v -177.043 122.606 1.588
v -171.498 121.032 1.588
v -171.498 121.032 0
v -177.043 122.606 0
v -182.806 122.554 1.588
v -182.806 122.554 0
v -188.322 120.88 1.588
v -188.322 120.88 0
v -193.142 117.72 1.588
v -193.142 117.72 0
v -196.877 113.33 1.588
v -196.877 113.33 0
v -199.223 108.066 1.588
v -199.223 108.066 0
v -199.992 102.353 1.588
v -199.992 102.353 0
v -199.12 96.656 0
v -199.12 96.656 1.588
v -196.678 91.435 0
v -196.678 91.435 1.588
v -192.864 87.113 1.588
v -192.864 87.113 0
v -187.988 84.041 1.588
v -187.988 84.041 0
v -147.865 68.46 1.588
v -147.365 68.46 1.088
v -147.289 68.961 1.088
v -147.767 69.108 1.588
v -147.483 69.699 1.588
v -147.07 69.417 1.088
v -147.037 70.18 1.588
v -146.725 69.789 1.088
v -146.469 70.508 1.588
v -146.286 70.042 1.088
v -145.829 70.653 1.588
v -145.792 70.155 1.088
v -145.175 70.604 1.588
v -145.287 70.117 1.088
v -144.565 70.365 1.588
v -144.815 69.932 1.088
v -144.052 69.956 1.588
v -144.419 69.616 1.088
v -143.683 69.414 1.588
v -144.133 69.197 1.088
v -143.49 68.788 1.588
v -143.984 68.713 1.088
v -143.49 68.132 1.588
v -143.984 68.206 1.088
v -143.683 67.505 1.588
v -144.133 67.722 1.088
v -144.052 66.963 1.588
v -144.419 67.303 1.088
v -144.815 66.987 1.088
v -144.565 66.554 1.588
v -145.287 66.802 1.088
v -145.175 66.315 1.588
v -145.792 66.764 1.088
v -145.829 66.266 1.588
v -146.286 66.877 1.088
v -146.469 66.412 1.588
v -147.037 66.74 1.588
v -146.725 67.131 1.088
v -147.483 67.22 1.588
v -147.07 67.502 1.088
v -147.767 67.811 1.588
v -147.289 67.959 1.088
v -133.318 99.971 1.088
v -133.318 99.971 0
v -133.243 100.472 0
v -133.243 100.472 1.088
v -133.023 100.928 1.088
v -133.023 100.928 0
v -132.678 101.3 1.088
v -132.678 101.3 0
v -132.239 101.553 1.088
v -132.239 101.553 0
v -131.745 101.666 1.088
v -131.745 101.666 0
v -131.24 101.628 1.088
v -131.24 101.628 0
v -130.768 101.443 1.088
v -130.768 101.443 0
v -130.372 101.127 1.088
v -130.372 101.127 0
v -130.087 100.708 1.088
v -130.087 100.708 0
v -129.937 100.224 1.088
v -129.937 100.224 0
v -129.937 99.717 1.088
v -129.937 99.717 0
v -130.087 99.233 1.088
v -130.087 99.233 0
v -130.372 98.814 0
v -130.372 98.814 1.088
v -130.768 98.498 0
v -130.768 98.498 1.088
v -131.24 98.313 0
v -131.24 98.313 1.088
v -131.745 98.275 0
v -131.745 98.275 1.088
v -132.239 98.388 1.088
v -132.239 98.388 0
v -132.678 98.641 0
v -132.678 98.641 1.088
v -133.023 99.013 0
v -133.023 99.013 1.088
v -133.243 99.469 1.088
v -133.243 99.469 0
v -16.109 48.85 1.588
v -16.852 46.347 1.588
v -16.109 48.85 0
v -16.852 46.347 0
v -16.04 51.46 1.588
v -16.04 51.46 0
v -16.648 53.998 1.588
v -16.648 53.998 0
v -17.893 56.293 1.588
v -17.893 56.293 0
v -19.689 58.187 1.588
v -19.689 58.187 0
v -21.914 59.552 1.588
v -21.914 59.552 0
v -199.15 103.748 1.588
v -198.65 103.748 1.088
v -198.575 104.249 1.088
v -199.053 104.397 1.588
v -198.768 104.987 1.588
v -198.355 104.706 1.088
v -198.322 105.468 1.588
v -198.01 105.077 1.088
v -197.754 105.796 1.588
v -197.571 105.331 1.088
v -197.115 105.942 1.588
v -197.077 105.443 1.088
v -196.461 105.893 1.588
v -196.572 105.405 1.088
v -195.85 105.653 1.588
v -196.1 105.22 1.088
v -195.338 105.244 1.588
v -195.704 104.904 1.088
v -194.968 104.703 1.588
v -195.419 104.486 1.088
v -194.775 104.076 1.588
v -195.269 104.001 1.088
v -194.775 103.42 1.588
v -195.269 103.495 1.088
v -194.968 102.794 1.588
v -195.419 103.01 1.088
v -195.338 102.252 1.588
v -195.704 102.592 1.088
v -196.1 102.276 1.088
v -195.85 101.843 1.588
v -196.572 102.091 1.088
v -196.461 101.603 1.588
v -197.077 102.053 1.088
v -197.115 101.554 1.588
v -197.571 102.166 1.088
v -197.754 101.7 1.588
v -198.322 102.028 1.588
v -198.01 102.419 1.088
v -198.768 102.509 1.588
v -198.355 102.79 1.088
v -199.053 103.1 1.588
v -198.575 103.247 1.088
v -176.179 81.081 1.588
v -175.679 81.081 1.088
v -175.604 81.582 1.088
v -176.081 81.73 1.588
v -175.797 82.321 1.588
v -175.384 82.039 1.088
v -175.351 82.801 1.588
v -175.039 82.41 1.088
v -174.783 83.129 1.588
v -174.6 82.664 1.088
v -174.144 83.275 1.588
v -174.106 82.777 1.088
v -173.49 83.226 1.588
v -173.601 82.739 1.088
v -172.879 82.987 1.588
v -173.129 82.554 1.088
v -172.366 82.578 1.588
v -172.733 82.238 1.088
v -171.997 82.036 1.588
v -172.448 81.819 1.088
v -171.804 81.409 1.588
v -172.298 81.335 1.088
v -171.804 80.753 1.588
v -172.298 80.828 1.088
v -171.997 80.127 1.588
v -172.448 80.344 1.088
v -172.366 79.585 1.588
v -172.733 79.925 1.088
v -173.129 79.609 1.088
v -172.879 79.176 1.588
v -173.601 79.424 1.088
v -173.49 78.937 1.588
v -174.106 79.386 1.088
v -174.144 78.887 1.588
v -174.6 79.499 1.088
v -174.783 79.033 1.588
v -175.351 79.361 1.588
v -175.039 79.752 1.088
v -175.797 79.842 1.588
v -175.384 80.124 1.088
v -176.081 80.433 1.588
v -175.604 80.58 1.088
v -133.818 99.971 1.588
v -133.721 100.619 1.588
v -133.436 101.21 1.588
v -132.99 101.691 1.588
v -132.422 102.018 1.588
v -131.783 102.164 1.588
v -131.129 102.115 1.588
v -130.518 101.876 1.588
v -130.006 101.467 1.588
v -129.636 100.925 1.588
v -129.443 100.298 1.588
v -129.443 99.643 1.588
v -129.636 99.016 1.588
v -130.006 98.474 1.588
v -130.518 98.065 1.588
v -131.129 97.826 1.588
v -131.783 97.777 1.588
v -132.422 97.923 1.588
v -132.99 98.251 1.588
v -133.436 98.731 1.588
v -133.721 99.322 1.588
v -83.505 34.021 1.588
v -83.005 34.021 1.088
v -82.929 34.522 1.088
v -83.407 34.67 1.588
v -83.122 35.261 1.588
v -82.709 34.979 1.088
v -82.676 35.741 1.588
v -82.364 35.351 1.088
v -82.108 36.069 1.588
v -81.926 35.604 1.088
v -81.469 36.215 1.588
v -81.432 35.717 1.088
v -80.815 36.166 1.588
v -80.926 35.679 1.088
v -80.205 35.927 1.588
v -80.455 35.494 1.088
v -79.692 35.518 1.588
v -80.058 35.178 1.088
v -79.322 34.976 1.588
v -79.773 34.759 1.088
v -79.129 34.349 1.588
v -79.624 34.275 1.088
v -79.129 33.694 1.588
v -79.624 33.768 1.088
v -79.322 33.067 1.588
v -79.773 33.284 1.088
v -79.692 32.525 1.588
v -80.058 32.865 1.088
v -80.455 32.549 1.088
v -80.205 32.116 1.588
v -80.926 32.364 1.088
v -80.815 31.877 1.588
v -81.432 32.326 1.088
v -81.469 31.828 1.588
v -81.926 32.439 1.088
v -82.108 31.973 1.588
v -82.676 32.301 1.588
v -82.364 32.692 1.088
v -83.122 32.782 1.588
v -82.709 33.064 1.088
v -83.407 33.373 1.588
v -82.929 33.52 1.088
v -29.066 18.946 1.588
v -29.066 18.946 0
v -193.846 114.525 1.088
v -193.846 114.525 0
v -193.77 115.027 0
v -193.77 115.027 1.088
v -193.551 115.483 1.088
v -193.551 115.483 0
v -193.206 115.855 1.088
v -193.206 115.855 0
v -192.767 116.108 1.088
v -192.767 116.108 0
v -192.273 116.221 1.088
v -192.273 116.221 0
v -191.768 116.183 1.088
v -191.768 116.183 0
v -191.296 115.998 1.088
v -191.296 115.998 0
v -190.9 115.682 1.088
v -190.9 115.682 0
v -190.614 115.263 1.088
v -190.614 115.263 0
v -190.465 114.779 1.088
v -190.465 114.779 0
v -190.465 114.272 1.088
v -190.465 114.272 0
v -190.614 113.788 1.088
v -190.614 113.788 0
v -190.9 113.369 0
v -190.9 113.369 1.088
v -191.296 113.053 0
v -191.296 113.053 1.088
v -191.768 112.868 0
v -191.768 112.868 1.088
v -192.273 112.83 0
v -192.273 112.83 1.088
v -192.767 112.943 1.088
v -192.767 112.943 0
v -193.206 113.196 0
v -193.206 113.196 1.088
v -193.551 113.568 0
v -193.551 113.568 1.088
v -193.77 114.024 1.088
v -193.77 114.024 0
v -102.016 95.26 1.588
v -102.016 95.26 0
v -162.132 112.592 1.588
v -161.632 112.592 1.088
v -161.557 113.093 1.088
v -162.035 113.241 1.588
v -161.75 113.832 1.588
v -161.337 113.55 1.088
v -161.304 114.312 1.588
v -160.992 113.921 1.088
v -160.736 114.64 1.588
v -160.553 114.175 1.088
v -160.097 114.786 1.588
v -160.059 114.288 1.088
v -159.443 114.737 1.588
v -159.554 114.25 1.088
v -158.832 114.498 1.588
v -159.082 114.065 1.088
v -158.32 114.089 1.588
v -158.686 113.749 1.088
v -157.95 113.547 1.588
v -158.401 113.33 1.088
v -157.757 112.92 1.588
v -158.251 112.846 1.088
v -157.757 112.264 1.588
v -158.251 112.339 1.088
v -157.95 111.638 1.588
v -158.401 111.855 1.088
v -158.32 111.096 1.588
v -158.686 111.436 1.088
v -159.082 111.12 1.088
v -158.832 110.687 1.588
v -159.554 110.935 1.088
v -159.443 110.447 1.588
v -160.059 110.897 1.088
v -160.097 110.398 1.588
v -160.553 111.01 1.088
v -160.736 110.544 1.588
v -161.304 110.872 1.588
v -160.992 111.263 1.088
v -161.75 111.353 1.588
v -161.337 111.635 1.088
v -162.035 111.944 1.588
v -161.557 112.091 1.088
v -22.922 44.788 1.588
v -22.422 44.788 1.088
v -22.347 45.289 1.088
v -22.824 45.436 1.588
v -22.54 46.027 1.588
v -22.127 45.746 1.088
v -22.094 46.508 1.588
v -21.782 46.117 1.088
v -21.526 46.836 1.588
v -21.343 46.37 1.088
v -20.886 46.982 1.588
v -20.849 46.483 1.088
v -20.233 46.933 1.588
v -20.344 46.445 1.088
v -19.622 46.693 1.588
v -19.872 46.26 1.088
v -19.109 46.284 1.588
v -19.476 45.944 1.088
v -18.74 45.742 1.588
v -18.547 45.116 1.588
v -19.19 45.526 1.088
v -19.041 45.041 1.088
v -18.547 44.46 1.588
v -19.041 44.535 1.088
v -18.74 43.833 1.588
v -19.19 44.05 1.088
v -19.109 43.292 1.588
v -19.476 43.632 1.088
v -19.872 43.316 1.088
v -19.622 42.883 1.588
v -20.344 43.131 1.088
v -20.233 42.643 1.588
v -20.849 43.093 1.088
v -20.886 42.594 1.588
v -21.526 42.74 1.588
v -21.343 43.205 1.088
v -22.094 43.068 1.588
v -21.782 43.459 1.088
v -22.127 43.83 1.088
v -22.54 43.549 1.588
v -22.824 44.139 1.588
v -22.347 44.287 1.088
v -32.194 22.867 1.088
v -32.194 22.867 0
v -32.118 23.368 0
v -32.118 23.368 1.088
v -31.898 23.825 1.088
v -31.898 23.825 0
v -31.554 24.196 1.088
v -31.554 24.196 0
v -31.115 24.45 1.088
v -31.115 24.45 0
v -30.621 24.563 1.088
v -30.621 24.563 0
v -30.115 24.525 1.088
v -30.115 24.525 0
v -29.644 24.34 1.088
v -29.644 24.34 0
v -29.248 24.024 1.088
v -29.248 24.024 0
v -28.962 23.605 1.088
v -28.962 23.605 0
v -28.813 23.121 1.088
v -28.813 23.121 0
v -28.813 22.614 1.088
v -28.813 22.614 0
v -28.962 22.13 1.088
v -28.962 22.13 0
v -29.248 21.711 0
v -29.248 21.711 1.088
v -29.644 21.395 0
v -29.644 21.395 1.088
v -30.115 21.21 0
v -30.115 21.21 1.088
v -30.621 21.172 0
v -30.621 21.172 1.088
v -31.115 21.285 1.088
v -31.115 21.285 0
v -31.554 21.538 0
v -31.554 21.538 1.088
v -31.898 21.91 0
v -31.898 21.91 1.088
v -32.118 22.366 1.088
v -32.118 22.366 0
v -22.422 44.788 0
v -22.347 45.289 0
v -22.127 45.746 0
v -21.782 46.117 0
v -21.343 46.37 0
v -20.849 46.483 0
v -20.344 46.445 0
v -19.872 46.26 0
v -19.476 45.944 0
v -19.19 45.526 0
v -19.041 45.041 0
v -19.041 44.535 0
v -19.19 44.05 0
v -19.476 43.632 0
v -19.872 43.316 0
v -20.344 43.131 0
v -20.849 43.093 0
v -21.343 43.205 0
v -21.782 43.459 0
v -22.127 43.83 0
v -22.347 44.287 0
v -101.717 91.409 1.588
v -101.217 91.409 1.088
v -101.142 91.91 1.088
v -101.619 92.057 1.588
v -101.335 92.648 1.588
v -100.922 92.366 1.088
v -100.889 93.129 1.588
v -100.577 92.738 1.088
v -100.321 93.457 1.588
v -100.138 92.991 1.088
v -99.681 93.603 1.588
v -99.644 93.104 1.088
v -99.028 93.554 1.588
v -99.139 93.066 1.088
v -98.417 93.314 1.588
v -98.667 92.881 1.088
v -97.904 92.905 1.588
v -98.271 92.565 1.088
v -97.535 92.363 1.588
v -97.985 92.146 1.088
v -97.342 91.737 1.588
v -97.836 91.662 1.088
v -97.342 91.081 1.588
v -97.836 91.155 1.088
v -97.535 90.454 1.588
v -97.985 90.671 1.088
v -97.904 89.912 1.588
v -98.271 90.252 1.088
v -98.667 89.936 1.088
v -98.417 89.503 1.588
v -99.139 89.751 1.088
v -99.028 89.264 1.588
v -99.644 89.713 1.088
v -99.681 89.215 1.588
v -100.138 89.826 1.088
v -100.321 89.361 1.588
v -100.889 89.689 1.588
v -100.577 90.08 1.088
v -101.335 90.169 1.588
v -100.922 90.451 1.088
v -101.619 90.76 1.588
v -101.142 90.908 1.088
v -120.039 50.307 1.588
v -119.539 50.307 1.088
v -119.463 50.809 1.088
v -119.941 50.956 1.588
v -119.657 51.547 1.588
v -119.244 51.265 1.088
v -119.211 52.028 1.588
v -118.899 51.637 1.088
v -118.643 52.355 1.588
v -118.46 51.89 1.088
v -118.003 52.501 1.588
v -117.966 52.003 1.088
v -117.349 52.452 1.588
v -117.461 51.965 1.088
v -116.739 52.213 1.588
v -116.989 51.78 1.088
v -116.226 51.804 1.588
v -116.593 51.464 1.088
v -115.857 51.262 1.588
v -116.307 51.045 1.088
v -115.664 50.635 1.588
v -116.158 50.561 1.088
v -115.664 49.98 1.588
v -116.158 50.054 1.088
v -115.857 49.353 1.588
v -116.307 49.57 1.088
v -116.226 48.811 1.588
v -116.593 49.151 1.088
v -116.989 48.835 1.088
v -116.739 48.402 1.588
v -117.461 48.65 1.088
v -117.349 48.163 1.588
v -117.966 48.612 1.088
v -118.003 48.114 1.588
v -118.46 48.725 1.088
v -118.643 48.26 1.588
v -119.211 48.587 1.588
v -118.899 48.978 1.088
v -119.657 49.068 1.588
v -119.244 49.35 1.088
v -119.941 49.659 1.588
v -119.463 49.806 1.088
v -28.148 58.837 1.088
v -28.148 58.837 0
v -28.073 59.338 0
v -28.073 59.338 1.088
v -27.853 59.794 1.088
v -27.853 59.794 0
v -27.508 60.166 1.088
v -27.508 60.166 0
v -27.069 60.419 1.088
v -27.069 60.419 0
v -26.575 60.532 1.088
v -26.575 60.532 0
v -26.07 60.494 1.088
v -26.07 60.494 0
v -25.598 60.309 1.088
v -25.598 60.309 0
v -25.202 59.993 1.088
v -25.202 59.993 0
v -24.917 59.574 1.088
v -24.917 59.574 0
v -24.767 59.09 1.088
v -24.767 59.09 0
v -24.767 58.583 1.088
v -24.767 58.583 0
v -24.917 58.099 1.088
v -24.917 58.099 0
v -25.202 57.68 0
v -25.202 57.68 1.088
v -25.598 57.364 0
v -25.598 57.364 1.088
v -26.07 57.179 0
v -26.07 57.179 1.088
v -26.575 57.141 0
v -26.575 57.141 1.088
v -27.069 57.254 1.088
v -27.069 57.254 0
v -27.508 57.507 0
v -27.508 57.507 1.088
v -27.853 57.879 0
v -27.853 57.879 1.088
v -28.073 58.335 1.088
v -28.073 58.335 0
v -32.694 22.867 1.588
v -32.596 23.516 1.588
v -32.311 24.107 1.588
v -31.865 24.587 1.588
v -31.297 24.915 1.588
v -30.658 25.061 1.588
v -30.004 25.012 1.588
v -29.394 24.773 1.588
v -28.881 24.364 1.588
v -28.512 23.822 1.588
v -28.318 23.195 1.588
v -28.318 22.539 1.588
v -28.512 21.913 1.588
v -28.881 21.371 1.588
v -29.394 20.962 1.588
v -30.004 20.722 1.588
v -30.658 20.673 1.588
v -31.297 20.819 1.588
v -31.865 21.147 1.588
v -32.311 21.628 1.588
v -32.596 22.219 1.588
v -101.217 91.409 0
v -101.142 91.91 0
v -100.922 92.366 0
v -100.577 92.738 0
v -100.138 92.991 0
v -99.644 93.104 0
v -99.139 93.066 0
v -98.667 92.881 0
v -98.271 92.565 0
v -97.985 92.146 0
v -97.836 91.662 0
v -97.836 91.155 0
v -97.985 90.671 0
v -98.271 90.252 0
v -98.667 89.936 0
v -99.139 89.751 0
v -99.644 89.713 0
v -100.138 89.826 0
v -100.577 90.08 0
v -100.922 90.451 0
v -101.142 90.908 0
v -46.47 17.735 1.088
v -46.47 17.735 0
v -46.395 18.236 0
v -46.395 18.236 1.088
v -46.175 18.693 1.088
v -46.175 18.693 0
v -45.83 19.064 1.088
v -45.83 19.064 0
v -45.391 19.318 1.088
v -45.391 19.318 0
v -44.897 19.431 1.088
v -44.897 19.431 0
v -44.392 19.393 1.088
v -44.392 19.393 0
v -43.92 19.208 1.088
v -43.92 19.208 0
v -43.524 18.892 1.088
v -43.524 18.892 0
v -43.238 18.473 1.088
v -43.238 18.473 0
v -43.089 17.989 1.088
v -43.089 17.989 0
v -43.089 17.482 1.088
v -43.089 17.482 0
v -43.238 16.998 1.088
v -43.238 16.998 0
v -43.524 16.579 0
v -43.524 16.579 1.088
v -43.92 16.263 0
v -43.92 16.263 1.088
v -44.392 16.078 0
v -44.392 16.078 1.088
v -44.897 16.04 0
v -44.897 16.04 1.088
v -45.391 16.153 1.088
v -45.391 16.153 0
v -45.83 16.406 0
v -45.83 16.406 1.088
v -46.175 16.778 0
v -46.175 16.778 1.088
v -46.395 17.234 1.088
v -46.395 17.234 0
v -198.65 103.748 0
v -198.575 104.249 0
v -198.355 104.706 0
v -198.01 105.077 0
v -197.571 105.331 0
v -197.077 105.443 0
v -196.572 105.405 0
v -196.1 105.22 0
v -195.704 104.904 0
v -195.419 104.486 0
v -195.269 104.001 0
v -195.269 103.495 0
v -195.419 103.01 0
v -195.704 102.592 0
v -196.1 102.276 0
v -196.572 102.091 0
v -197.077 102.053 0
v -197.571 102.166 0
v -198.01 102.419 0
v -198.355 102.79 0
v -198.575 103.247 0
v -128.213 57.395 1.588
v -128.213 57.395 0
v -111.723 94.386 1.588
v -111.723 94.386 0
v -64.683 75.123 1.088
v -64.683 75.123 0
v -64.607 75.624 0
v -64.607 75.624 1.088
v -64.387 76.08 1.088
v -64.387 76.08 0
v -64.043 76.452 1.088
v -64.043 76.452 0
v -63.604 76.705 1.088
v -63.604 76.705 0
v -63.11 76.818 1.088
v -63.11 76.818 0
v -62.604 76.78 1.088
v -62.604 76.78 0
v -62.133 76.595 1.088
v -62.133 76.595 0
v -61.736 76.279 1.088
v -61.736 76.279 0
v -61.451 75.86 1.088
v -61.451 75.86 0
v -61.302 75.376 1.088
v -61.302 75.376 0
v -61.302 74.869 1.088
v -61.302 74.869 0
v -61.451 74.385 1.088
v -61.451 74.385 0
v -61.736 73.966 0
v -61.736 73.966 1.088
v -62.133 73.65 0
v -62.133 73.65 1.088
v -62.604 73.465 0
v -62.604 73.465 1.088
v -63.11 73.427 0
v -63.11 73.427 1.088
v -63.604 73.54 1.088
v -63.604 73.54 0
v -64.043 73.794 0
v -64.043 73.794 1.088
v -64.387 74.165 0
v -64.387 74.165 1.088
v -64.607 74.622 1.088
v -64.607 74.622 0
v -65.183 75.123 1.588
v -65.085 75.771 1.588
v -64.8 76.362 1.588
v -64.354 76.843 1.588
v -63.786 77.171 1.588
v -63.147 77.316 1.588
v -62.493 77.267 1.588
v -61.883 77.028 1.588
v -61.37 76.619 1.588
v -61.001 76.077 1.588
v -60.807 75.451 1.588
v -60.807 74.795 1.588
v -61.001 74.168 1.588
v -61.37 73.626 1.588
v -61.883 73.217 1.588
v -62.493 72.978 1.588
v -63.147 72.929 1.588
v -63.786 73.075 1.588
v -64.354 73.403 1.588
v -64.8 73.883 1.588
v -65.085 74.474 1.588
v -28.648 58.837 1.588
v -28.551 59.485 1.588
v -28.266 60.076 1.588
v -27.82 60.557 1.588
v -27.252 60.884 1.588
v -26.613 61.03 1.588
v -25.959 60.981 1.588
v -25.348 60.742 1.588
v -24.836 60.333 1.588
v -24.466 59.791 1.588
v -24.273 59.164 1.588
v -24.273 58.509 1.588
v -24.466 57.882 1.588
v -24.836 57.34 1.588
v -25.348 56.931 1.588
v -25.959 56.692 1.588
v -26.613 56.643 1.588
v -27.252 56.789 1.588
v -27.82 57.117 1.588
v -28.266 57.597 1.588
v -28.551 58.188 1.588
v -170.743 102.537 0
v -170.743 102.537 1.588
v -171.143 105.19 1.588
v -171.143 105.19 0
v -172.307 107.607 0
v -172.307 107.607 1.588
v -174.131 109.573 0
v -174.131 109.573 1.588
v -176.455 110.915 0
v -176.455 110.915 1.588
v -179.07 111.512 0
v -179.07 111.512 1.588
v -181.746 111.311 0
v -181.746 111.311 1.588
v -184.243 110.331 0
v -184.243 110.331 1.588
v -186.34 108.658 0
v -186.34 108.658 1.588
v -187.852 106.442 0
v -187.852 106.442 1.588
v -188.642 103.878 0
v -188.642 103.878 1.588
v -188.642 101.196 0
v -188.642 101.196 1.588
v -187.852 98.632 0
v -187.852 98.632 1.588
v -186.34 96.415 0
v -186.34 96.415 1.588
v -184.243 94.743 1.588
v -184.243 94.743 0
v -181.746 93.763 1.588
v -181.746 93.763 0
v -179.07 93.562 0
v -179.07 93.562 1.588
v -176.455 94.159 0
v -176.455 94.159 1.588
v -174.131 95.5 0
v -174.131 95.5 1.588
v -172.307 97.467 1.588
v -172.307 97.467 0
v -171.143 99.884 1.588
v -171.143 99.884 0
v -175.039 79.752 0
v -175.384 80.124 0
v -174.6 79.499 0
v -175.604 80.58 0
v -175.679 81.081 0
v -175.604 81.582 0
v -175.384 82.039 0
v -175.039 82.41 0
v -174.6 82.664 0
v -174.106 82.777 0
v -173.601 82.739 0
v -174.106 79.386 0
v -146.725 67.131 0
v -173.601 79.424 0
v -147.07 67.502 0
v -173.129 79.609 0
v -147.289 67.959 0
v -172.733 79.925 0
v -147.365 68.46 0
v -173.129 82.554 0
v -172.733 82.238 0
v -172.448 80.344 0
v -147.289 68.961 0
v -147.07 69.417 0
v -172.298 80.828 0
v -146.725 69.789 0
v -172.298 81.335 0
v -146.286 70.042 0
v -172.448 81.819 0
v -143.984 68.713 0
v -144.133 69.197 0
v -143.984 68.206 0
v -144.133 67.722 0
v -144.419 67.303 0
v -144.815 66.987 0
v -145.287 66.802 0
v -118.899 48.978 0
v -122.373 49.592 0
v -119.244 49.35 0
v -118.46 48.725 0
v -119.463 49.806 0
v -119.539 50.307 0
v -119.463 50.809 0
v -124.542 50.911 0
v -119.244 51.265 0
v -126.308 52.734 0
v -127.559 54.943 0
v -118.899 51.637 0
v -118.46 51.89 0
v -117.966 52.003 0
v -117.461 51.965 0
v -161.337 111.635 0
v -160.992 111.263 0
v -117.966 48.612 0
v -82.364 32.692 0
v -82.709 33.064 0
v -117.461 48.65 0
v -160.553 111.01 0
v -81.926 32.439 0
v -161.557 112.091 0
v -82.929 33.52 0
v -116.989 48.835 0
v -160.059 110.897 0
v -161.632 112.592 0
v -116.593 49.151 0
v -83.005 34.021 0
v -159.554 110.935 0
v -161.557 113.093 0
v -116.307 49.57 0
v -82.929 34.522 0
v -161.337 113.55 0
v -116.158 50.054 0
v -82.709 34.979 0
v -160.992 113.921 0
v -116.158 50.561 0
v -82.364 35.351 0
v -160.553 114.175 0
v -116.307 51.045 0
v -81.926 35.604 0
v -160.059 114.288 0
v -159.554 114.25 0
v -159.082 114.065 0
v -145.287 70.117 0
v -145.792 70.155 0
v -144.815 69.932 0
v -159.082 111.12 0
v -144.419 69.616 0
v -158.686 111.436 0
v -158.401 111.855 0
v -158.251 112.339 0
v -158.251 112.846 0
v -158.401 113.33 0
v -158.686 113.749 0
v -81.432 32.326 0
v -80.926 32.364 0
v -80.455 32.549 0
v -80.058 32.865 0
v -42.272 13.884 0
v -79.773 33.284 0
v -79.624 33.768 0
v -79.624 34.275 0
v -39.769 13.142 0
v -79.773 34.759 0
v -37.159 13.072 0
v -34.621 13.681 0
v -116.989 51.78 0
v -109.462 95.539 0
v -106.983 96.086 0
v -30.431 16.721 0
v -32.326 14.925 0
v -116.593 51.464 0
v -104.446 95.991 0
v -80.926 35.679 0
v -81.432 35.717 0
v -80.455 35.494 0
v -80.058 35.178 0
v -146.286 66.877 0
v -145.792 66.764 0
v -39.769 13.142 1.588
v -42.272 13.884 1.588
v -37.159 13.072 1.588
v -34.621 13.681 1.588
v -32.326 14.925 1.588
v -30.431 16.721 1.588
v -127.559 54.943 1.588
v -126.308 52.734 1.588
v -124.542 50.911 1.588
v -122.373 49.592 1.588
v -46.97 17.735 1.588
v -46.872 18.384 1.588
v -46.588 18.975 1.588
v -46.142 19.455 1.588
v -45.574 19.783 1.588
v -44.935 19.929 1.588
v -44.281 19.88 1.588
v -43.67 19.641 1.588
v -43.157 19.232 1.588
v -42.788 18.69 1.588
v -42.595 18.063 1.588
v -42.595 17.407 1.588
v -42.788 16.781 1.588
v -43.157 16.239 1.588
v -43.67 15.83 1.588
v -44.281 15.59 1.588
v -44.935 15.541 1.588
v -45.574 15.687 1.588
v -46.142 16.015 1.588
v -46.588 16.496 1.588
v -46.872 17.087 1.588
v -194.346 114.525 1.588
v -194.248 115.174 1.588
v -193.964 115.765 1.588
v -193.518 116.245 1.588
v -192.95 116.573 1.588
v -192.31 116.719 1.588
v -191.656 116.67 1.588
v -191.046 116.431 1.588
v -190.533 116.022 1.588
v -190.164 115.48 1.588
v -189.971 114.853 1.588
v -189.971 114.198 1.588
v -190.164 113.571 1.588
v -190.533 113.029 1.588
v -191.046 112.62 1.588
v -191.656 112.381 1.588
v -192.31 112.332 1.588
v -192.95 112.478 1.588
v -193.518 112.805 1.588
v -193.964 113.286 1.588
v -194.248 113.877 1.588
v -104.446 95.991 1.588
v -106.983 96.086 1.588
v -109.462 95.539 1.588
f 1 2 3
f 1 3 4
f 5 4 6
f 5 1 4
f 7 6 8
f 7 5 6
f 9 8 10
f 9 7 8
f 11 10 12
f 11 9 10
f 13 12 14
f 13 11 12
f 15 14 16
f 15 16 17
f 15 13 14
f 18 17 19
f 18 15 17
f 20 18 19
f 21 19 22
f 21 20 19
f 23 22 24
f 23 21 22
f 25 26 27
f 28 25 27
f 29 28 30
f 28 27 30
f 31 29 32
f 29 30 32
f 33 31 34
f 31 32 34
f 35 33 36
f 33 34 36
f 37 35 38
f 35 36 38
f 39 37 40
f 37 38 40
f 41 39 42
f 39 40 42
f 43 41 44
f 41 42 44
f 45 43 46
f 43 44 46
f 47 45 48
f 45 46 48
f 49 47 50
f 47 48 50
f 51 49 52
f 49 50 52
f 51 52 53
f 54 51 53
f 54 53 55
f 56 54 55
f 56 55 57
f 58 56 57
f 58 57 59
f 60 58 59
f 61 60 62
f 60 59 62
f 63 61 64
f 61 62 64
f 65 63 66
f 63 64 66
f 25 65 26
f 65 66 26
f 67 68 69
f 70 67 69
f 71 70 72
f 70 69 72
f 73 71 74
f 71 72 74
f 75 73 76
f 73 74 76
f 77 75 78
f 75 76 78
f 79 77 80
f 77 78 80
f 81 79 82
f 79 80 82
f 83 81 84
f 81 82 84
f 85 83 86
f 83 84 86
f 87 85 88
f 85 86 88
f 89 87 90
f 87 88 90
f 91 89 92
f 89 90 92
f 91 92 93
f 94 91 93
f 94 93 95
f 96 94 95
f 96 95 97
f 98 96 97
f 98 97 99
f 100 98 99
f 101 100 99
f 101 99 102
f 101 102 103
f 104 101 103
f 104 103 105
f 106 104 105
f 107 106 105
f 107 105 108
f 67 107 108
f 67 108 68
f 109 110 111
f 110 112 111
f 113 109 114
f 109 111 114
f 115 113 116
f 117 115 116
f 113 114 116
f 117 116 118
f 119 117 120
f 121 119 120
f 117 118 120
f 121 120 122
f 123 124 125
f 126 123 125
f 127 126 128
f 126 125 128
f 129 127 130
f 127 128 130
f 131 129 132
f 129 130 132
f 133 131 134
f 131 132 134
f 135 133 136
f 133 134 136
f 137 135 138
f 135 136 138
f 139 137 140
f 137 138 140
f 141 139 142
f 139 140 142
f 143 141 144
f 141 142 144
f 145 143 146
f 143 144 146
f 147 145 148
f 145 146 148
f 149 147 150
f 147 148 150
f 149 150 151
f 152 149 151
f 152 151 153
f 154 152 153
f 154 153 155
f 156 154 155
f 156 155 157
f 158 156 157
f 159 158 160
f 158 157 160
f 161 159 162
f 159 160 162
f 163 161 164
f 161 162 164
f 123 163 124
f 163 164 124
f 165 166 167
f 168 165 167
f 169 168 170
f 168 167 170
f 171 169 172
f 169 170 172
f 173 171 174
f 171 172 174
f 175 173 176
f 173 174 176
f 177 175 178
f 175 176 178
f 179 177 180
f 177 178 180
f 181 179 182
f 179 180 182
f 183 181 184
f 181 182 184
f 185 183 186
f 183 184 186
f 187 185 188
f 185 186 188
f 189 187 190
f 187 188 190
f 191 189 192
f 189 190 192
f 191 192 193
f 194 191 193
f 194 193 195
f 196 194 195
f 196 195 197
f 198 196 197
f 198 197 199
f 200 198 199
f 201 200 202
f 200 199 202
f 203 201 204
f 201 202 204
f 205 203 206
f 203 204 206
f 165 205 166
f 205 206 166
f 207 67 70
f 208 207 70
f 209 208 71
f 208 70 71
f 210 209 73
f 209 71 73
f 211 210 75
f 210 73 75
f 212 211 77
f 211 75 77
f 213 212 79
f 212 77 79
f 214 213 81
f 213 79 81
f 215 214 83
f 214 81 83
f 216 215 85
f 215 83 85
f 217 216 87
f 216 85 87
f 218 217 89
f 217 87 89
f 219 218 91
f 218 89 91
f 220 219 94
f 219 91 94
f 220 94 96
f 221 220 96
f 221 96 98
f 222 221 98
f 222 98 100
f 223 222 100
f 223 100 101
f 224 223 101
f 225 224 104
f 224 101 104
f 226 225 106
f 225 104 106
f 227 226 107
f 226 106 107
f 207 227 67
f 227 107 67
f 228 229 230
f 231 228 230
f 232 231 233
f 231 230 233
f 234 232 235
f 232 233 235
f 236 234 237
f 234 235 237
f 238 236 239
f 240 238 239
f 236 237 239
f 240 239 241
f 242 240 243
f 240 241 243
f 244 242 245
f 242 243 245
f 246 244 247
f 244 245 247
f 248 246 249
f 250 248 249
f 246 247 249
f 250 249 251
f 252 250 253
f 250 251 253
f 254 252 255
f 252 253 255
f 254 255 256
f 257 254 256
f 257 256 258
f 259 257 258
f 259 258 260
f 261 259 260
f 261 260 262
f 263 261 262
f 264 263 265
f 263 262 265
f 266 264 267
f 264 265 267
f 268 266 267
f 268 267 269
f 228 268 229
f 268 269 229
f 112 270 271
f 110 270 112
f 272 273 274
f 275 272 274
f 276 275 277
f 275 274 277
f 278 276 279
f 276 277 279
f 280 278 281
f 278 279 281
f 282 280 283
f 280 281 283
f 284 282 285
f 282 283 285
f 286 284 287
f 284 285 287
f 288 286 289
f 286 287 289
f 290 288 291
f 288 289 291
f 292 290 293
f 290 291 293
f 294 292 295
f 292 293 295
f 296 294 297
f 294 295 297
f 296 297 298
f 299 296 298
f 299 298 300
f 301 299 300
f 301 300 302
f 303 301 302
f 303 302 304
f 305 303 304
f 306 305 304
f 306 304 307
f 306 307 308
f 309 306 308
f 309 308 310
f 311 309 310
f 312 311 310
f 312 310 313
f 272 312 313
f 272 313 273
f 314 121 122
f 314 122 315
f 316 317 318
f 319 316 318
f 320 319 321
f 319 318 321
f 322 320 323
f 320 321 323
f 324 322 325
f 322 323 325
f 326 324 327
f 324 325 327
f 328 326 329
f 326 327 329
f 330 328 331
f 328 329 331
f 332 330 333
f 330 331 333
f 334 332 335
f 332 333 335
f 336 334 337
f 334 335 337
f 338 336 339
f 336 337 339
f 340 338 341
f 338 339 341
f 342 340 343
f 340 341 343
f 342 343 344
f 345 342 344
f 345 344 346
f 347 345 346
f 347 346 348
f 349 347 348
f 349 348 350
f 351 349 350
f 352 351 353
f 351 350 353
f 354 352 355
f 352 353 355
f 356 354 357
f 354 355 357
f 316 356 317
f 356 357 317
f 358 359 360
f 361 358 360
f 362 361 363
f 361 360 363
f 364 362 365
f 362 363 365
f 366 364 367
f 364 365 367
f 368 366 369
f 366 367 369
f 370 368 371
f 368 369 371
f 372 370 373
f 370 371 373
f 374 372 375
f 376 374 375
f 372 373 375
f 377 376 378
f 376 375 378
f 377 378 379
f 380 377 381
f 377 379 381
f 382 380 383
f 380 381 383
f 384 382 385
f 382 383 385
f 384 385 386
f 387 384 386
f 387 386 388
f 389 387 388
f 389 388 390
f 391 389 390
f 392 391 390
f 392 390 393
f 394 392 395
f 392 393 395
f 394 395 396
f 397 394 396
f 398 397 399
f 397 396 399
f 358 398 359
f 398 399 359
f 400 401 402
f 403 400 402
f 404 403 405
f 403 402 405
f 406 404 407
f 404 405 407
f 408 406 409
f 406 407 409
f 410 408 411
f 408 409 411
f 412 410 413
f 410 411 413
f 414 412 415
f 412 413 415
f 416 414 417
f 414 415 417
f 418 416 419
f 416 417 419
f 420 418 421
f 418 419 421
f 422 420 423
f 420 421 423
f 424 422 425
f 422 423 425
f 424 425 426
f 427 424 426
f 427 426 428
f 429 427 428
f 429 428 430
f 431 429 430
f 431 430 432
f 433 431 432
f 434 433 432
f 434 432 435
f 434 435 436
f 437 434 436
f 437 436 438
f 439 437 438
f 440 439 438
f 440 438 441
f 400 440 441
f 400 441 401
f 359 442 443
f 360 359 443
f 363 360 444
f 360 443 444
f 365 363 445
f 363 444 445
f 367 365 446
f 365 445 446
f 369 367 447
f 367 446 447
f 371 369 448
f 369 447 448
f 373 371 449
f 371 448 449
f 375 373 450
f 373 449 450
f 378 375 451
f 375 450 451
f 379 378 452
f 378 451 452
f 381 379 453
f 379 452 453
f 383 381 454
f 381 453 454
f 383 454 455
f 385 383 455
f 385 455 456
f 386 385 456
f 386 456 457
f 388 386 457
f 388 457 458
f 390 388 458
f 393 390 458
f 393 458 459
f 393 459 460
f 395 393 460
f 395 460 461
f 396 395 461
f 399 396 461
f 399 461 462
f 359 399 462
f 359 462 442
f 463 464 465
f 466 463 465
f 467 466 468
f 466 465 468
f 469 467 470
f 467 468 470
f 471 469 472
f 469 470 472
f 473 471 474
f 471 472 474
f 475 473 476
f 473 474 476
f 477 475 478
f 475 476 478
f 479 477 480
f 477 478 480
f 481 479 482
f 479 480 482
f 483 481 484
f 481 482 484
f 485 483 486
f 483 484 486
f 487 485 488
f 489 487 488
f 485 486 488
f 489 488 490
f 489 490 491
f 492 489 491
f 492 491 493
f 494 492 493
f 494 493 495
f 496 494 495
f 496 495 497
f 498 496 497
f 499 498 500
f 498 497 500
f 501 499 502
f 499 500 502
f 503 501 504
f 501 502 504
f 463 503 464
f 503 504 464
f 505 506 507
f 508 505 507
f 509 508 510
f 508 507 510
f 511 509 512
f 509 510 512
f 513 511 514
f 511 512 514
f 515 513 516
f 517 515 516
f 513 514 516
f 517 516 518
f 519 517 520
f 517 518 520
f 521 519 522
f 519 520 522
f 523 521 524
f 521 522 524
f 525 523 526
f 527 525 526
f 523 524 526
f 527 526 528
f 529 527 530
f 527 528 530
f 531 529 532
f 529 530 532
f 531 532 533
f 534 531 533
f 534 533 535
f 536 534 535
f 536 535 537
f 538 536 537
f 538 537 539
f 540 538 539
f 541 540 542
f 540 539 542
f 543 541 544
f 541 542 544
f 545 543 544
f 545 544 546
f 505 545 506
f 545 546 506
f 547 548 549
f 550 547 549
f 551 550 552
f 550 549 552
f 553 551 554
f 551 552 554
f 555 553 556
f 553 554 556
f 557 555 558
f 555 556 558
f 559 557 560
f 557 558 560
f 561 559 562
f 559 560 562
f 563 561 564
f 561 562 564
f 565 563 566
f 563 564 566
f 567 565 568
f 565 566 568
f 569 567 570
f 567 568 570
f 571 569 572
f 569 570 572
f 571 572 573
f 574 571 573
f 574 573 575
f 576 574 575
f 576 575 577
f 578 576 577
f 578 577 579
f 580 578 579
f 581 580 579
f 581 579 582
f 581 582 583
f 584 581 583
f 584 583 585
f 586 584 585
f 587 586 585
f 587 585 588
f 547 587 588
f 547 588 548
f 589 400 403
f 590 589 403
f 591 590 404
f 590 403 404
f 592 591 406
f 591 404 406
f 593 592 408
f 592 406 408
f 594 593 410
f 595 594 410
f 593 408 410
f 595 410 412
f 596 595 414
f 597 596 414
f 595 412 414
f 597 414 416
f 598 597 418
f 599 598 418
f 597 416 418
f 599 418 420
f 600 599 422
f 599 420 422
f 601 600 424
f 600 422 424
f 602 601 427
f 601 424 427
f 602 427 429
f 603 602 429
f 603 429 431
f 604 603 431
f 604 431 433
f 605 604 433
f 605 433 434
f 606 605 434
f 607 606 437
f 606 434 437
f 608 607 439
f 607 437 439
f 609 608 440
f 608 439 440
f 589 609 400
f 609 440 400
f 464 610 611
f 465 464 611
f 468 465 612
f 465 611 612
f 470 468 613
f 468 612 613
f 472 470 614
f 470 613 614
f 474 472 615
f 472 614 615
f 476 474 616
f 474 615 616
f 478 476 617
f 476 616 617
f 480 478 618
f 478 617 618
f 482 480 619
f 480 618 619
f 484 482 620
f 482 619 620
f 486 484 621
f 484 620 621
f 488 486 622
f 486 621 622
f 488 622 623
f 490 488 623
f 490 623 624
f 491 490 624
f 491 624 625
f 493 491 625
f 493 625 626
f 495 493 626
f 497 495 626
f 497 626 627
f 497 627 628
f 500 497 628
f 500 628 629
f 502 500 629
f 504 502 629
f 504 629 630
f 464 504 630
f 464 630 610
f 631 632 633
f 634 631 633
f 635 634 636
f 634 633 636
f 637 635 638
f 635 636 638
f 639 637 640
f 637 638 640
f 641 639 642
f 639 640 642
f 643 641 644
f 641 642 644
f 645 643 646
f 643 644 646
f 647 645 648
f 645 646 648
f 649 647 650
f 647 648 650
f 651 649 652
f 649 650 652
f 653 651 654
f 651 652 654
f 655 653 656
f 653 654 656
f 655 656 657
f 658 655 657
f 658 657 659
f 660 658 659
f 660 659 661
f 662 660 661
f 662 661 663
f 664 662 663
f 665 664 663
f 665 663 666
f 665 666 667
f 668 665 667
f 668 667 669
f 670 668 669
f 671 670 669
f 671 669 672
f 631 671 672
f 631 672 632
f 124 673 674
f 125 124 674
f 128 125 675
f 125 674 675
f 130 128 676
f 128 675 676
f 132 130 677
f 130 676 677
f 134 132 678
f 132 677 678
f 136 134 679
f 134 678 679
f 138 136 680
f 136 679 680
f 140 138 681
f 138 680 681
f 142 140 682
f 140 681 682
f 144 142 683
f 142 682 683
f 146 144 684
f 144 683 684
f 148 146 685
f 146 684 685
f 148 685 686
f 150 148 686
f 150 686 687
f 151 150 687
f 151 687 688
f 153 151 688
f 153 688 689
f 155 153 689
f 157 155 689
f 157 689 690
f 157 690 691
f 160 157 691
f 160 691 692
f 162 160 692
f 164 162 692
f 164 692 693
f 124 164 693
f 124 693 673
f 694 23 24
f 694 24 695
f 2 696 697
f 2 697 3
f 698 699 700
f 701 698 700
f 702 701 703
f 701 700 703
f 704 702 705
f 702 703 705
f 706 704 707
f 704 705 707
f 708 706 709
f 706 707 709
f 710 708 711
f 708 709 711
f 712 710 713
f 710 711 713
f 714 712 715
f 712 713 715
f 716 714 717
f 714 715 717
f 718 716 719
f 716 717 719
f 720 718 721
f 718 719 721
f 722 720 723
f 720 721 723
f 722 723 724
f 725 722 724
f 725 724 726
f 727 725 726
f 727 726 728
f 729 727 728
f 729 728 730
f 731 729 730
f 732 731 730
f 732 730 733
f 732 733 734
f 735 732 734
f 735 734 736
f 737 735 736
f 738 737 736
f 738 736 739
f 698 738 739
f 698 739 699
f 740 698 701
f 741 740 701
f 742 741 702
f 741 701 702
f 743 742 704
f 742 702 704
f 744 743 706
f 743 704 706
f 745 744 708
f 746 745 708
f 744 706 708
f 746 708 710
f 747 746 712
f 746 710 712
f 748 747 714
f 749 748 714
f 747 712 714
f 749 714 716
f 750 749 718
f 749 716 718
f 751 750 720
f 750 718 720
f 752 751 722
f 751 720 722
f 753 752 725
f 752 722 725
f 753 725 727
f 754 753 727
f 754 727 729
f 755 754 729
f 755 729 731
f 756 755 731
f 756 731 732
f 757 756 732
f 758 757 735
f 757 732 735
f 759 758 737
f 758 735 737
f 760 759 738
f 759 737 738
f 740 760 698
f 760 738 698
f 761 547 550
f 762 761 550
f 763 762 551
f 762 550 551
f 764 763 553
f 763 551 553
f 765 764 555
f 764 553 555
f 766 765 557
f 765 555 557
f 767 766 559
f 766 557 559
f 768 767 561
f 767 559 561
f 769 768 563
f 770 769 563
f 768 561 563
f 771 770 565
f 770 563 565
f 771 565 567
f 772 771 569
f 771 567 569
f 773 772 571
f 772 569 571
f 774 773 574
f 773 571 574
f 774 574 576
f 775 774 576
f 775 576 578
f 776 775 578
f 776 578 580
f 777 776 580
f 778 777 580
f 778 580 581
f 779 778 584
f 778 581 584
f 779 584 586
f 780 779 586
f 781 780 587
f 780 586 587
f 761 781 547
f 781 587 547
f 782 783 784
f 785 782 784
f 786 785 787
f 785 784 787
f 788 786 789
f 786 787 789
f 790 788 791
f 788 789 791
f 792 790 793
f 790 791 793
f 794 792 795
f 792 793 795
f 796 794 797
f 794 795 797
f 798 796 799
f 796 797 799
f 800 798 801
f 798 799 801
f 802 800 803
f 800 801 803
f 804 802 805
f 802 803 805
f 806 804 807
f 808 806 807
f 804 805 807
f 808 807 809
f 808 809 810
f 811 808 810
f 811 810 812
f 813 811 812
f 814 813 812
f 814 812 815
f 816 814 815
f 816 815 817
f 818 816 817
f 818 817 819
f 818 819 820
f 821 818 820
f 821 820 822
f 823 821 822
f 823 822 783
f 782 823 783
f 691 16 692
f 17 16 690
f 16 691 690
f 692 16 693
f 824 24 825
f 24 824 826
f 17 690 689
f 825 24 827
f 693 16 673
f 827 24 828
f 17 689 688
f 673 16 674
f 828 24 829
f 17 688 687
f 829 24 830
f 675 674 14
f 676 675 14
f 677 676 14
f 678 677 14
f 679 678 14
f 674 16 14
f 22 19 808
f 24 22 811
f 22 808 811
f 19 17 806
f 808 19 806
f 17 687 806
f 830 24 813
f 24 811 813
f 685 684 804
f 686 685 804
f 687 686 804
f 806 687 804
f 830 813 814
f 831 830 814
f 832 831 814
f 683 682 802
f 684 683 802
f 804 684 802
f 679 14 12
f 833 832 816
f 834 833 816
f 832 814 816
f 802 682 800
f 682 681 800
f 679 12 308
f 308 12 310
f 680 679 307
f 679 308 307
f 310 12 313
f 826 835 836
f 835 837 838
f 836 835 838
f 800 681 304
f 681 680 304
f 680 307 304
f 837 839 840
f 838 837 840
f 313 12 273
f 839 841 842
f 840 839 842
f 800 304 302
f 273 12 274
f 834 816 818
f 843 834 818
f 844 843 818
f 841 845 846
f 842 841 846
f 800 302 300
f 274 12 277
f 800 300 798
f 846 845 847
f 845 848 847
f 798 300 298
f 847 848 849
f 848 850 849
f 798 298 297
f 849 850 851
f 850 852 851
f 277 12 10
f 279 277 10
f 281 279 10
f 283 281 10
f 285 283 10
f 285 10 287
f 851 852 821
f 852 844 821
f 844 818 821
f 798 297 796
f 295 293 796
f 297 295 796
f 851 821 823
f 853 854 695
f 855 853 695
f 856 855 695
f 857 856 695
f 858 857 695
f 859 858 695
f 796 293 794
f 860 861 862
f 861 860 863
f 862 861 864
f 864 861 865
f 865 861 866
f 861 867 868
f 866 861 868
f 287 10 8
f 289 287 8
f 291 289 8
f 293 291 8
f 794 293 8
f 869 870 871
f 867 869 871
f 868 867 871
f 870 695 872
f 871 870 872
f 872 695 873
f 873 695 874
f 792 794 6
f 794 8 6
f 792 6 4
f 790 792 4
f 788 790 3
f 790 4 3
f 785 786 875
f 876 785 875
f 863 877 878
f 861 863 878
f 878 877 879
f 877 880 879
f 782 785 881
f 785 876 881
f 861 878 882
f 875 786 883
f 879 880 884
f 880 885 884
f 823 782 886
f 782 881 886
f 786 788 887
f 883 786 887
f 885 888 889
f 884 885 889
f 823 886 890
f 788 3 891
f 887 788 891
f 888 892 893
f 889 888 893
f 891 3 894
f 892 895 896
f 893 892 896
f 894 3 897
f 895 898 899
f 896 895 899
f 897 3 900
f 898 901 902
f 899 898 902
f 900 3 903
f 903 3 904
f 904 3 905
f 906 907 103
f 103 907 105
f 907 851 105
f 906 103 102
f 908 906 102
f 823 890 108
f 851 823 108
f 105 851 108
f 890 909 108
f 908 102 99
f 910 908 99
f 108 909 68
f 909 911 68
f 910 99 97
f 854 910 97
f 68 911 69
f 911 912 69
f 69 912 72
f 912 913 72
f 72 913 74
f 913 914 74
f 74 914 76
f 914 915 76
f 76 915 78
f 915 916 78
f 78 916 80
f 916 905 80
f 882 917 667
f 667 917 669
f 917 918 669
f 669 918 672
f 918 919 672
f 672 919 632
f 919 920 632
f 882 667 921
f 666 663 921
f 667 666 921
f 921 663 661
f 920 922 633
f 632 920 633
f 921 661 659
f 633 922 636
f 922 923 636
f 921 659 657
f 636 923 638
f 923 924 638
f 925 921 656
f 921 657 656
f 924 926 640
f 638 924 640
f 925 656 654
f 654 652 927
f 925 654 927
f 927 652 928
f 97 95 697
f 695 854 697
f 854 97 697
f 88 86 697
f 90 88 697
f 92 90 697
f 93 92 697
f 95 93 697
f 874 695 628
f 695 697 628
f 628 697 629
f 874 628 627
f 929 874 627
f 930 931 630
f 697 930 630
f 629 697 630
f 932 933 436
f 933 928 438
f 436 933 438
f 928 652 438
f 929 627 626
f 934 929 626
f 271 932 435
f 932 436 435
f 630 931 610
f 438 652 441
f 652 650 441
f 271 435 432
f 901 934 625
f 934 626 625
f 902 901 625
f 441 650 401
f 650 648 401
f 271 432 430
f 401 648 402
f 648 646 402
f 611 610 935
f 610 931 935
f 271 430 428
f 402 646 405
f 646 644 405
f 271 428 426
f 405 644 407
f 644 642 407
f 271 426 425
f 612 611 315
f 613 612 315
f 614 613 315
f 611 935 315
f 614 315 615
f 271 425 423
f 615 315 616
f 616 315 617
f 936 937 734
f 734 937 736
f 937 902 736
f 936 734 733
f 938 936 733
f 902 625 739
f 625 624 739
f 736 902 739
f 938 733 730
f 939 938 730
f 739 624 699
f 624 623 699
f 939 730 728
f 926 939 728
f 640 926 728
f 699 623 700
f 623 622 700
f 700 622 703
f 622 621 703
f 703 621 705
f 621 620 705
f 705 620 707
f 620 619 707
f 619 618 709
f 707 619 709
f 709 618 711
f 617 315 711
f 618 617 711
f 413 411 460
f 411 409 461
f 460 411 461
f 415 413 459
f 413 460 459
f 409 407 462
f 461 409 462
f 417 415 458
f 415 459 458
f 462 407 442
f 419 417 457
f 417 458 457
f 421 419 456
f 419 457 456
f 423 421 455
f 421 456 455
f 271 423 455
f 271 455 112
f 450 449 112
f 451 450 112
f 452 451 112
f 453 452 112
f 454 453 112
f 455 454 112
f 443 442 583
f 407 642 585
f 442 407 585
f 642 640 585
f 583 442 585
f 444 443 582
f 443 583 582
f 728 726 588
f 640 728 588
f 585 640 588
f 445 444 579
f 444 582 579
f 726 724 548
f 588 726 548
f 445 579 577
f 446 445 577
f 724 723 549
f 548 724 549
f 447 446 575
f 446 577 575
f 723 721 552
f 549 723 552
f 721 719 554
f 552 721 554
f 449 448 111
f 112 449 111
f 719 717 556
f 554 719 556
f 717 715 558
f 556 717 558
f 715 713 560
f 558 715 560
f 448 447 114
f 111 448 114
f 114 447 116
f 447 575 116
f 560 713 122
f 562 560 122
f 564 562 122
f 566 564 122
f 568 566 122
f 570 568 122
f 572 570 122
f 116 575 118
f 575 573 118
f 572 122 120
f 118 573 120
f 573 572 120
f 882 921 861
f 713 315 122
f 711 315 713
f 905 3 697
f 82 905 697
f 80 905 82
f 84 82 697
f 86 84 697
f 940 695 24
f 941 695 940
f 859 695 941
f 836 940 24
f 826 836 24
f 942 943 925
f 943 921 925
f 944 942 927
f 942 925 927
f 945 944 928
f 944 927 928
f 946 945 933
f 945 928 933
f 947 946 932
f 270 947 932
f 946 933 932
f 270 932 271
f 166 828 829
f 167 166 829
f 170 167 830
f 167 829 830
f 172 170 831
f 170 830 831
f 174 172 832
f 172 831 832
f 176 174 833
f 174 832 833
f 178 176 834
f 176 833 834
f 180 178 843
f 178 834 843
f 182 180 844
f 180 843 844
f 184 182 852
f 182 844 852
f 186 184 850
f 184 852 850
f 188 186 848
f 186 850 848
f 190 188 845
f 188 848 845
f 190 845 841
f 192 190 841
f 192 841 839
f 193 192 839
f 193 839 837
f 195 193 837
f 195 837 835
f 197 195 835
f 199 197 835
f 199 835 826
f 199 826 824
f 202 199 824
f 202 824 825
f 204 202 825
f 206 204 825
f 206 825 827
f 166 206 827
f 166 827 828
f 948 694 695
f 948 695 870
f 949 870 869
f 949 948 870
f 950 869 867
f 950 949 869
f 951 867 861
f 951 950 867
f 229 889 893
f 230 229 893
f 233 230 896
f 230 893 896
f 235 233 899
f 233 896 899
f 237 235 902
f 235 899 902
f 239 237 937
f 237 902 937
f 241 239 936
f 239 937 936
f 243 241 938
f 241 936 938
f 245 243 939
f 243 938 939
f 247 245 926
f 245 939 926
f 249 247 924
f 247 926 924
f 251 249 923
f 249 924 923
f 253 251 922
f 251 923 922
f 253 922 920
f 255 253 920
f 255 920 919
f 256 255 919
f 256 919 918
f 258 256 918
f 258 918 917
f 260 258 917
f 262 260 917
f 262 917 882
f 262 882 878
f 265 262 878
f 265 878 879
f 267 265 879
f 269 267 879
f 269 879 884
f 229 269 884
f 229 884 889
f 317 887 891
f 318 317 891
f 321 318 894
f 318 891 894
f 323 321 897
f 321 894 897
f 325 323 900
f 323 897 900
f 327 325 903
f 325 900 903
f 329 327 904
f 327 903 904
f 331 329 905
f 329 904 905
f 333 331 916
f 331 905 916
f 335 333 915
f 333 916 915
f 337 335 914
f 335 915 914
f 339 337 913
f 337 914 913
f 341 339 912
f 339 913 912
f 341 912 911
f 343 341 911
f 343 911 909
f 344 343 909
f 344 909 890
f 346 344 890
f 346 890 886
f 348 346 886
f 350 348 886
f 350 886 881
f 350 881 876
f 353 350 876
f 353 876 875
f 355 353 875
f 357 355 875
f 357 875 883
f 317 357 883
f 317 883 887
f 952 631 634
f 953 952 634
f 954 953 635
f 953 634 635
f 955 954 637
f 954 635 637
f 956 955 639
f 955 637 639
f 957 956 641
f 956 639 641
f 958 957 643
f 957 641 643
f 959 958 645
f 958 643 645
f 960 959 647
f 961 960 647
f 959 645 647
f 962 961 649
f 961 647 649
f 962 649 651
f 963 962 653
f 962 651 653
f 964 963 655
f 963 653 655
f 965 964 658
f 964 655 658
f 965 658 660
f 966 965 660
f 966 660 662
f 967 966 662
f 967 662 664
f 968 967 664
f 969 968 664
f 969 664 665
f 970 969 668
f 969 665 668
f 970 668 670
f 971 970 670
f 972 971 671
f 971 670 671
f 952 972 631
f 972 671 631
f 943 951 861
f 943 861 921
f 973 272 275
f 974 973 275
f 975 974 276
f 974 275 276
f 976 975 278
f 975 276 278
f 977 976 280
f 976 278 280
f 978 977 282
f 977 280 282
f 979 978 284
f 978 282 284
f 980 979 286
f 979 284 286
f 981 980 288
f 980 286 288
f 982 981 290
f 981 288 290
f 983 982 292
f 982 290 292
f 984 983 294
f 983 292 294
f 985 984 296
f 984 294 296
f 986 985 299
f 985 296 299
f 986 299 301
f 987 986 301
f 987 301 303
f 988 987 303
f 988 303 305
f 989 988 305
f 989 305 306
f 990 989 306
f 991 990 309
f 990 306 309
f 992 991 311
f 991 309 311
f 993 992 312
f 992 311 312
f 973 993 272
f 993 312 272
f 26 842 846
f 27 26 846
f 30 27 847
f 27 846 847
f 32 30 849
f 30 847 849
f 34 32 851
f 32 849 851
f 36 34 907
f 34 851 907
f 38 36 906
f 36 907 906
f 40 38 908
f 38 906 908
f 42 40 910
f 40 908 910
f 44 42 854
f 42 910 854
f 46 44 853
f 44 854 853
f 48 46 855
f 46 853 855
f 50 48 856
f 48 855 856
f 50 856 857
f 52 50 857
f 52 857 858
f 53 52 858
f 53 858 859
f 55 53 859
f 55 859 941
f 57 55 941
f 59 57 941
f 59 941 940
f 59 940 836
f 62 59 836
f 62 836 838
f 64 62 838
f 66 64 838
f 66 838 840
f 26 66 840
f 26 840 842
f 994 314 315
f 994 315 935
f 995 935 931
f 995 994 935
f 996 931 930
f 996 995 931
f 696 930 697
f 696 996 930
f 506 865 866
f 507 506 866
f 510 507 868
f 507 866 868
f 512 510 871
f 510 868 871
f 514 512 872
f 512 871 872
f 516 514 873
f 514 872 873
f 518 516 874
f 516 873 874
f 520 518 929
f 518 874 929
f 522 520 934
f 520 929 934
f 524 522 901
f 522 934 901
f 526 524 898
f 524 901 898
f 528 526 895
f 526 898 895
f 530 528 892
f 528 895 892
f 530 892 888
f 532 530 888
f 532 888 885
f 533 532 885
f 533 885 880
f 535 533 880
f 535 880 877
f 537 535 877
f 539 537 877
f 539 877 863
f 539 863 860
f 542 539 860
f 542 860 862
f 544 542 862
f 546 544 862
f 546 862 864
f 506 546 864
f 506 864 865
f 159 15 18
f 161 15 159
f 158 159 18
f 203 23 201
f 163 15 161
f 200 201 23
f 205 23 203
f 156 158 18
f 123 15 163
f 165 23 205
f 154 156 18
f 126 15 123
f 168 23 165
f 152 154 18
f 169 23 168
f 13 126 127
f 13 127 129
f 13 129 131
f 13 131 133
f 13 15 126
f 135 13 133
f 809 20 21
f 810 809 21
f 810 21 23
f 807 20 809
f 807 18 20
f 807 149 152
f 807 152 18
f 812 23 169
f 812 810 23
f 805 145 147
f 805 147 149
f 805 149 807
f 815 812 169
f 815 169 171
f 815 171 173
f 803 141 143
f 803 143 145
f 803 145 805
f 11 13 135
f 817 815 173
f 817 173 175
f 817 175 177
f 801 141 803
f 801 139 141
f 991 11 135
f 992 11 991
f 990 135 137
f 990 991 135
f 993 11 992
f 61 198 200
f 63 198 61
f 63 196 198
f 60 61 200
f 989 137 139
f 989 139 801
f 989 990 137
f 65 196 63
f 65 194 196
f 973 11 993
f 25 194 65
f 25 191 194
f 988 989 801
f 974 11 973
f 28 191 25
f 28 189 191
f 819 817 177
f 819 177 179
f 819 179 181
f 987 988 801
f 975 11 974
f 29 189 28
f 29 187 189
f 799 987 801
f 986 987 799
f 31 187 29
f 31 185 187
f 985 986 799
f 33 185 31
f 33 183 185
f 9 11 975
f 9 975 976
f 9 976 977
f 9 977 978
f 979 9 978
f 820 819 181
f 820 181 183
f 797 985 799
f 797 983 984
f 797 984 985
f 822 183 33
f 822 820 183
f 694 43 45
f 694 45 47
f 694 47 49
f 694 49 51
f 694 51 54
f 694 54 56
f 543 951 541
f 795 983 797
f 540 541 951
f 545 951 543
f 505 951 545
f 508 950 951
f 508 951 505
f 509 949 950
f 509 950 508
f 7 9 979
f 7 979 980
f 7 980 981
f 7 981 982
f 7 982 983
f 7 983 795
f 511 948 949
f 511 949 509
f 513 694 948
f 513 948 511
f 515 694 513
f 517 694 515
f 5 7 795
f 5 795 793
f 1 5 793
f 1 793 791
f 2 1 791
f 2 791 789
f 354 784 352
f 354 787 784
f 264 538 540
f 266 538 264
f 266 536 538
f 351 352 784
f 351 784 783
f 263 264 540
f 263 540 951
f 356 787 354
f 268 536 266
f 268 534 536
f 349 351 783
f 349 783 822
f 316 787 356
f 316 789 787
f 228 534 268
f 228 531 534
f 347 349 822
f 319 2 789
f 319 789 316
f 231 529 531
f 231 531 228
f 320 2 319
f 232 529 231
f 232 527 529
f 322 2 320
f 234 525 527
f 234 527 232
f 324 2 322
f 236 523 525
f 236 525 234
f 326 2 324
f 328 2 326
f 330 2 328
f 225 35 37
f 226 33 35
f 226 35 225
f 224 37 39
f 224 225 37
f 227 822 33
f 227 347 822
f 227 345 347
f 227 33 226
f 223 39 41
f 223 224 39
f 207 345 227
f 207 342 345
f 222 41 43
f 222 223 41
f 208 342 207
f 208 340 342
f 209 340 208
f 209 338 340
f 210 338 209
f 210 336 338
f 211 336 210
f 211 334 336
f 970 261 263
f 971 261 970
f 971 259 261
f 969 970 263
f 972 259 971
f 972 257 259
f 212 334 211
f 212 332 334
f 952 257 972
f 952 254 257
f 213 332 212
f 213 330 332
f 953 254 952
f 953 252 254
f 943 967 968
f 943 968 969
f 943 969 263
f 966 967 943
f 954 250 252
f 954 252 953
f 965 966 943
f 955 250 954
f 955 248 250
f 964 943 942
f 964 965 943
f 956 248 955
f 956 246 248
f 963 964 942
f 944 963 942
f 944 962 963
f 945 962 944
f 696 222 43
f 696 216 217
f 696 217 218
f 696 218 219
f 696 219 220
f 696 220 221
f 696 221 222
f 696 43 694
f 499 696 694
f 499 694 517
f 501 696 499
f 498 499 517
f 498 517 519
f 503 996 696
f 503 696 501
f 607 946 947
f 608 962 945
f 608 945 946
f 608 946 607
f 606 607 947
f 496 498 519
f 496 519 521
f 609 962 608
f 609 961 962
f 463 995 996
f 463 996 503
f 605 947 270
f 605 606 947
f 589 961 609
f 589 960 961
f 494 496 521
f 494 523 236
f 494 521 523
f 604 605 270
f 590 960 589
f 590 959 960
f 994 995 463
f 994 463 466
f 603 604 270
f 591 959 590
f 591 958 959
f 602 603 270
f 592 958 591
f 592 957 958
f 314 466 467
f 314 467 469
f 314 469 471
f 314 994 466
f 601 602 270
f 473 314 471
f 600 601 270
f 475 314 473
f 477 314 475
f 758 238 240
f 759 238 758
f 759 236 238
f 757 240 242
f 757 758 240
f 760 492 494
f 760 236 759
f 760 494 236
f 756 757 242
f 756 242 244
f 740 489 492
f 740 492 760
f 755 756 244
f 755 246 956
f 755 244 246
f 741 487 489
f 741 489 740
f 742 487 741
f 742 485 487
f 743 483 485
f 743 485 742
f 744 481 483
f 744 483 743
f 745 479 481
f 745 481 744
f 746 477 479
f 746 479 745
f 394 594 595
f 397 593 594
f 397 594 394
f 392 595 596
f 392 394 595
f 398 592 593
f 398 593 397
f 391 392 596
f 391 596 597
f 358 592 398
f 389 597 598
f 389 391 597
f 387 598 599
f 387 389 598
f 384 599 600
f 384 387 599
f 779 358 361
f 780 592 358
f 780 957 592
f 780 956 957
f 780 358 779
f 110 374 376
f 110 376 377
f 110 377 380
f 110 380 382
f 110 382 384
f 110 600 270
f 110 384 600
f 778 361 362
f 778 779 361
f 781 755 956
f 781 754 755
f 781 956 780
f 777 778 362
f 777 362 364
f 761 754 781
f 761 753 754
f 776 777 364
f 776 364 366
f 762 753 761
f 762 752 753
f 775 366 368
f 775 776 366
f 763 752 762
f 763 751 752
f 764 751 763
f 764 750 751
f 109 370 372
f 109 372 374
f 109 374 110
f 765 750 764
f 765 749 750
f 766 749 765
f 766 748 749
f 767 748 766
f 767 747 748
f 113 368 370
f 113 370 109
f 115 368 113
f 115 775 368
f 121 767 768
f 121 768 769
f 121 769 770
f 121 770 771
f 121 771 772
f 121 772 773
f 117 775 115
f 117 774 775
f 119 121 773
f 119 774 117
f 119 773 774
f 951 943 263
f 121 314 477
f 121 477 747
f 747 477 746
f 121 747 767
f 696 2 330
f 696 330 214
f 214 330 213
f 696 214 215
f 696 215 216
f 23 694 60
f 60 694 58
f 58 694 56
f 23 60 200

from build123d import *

# Parameters (mm, degrees)
BOSS_EXTRUDE1_DEPTH       = 1.5875
F_4_CLEARANCE_HOLE1_D     = 3.4
F_4_CLEARANCE_HOLE1_DEPTH = 1.5875
HOLE1_D                   = 18
HOLE1_DEPTH               = 1.5875
CHAMFER1_SIZE             = 0.5
FILLET1_R                 = 10


with BuildPart() as part:
    # Sketch1 → Boss-Extrude1 (new body)
    with BuildSketch(Plane.XY.offset(1.5875)):
        with BuildLine():
            Line((-122.373252992, 49.591627472), (-33.137949262, 9.81285715))
            Line((-33.137949262, 9.81285715), (-12.780339067, 55.480873389))
            Line((-12.780339067, 55.480873389), (-102.015642796, 95.25964371))
            ThreePointArc((-102.015642796, 95.25964371), (-106.983028684, 96.085831021), (-111.723245825, 94.386463641))
            Line((-111.723245825, 94.386463641), (-171.498000771, 121.032489918))
            ThreePointArc((-171.498000771, 121.032489918), (-198.238379477, 110.781775471), (-187.98766503, 84.041396765))
            Line((-187.98766503, 84.041396765), (-128.212910083, 57.395370488))
            ThreePointArc((-128.212910083, 57.395370488), (-126.308202352, 52.73386896), (-122.373252992, 49.591627472))
        make_face()
    extrude(amount=-BOSS_EXTRUDE1_DEPTH)

    # #4 Clearance Hole1
    with Locations(Plane.XY.offset(1.5875)):
        with Locations((-99.517086056, 91.408706914), (-62.982673065, 75.122618757), (-26.448260075, 58.836530601), (-20.722062659, 44.787930558), (-30.493715553, 22.867282764), (-44.77010925, 17.735315986), (-81.304522241, 34.021404143), (-117.838935231, 50.307492299), (-131.618242769, 99.970559768), (-145.664993804, 68.459628564), (-173.979163871, 81.081346885), (-159.932412836, 112.592278089), (-192.145991763, 114.525444092), (-196.950263565, 103.748070885)):
            Hole(F_4_CLEARANCE_HOLE1_D / 2, depth=F_4_CLEARANCE_HOLE1_DEPTH)

    # Hole1
    with Locations(Plane(origin=(0, 0, 0), x_dir=(-1, 0, 0), z_dir=(0, 0, -1))):
        with Locations((179.7428329, 102.536943342)):
            Hole(HOLE1_D / 2, depth=HOLE1_DEPTH)

    # Chamfer1
    chamfer1_edges = [part.edges().sort_by_distance(p)[0] for p in [
        (-24.748260075, 58.836530601, 1.5875),
        (-61.282673065, 75.122618757, 1.5875),
        (-97.817086056, 91.408706914, 1.5875),
        (-195.250263565, 103.748070885, 1.5875),
        (-190.445991763, 114.525444092, 1.5875),
        (-158.232412836, 112.592278089, 1.5875),
        (-172.279163871, 81.081346885, 1.5875),
        (-143.964993804, 68.459628564, 1.5875),
        (-129.918242769, 99.970559768, 1.5875),
        (-116.138935231, 50.307492299, 1.5875),
        (-79.604522241, 34.021404143, 1.5875),
        (-43.07010925, 17.735315986, 1.5875),
        (-28.793715553, 22.867282764, 1.5875),
        (-19.022062659, 44.787930558, 1.5875),
    ]]
    chamfer(chamfer1_edges, length=CHAMFER1_SIZE)

    # Fillet1
    fillet1_edges = [part.edges().sort_by_distance(p)[0] for p in [
        (-12.780339067, 55.480873389, 0.79375),
        (-33.137949262, 9.81285715, 0.79375),
    ]]
    fillet(fillet1_edges, radius=FILLET1_R)


solid = part.part
